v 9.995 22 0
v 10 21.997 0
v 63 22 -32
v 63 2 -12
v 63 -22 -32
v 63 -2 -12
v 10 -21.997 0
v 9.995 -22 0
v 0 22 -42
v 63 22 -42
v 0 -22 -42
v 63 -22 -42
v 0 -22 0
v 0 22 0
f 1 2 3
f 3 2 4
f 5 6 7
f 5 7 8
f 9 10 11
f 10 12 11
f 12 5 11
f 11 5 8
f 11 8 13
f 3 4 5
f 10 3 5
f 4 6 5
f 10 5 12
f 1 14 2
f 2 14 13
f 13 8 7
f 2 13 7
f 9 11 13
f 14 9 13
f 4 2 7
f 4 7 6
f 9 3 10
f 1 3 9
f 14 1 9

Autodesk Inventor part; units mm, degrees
ref_plane "YZ Plane" through (0, 0, 0) normal (1, 0, 0) x (0, 1, 0)
ref_plane "XZ Plane" through (0, 0, 0) normal (0, 1, 0) x (-1, 0, 0)
sketch "草圖1" plane through (0, 0, 0) normal (0, 1, 0) x (-1, 0, 0)
  line L0 (0, 0) -> (-63, 0)
  line L1 (-63, 0) -> (-63, -42)
  line L2 (-63, -42) -> (0, -42)
  line L3 (0, -42) -> (0, 0)
  dimension "d0" = 63
  dimension "d1" = 42
extrude "擠出1" add sketch "草圖1" along normal mid plane 44
sketch "草圖2" plane through (0, 22, 0) normal (0, 1, 0) x (1, 0, 0)
  line L0 (0, 0) -> (63, 0) projected
  line L1 (10, 0) -> (63, 12)
  line L2 (63, 0) -> (63, 42) projected
  dimension "d4" = 10
  dimension "d5" = 30
extrude "擠出2" cut sketch "草圖2" against normal blind 60
sketch "草圖3" plane through (63, -22, -42) normal (1, 0, 0) x (0, 0, -1)
  line L0 (-30, 24) -> (-10, 44)
  line L1 (0, 44) -> (-42, 44) projected
  line L2 (-30, 44) -> (-30, 0) projected
  point P0 (-42, 22)
  point P1 (-30, 2)
  dimension "d8" = 20
  dimension "d9" = 20
ref_plane "工作平面1" through (10, 22, 0) normal (-0.3926, -0.6503, -0.6503) x (0.8561, 0, -0.5169)
sketch "草圖4" plane through (10, 22, 0) normal (-0.3926, -0.6503, -0.6503) x (0.8561, 0, -0.5169)
  line L0 (-15.1543, -12.3218) -> (93.717, -12.3218)
  line L1 (93.717, -12.3218) -> (93.717, 28.8166)
  line L2 (93.717, 28.8166) -> (-15.1543, 28.8166)
  line L3 (-15.1543, 28.8166) -> (-15.1543, -12.3218)
  point P0 (-8.5606, 13.3512)
extrude "擠出3" cut sketch "草圖4" against normal blind 40
mirror "鏡射1" about plane through (0, 0, 0) normal (0, 1, 0) of "擠出3"
properties part number "59"
